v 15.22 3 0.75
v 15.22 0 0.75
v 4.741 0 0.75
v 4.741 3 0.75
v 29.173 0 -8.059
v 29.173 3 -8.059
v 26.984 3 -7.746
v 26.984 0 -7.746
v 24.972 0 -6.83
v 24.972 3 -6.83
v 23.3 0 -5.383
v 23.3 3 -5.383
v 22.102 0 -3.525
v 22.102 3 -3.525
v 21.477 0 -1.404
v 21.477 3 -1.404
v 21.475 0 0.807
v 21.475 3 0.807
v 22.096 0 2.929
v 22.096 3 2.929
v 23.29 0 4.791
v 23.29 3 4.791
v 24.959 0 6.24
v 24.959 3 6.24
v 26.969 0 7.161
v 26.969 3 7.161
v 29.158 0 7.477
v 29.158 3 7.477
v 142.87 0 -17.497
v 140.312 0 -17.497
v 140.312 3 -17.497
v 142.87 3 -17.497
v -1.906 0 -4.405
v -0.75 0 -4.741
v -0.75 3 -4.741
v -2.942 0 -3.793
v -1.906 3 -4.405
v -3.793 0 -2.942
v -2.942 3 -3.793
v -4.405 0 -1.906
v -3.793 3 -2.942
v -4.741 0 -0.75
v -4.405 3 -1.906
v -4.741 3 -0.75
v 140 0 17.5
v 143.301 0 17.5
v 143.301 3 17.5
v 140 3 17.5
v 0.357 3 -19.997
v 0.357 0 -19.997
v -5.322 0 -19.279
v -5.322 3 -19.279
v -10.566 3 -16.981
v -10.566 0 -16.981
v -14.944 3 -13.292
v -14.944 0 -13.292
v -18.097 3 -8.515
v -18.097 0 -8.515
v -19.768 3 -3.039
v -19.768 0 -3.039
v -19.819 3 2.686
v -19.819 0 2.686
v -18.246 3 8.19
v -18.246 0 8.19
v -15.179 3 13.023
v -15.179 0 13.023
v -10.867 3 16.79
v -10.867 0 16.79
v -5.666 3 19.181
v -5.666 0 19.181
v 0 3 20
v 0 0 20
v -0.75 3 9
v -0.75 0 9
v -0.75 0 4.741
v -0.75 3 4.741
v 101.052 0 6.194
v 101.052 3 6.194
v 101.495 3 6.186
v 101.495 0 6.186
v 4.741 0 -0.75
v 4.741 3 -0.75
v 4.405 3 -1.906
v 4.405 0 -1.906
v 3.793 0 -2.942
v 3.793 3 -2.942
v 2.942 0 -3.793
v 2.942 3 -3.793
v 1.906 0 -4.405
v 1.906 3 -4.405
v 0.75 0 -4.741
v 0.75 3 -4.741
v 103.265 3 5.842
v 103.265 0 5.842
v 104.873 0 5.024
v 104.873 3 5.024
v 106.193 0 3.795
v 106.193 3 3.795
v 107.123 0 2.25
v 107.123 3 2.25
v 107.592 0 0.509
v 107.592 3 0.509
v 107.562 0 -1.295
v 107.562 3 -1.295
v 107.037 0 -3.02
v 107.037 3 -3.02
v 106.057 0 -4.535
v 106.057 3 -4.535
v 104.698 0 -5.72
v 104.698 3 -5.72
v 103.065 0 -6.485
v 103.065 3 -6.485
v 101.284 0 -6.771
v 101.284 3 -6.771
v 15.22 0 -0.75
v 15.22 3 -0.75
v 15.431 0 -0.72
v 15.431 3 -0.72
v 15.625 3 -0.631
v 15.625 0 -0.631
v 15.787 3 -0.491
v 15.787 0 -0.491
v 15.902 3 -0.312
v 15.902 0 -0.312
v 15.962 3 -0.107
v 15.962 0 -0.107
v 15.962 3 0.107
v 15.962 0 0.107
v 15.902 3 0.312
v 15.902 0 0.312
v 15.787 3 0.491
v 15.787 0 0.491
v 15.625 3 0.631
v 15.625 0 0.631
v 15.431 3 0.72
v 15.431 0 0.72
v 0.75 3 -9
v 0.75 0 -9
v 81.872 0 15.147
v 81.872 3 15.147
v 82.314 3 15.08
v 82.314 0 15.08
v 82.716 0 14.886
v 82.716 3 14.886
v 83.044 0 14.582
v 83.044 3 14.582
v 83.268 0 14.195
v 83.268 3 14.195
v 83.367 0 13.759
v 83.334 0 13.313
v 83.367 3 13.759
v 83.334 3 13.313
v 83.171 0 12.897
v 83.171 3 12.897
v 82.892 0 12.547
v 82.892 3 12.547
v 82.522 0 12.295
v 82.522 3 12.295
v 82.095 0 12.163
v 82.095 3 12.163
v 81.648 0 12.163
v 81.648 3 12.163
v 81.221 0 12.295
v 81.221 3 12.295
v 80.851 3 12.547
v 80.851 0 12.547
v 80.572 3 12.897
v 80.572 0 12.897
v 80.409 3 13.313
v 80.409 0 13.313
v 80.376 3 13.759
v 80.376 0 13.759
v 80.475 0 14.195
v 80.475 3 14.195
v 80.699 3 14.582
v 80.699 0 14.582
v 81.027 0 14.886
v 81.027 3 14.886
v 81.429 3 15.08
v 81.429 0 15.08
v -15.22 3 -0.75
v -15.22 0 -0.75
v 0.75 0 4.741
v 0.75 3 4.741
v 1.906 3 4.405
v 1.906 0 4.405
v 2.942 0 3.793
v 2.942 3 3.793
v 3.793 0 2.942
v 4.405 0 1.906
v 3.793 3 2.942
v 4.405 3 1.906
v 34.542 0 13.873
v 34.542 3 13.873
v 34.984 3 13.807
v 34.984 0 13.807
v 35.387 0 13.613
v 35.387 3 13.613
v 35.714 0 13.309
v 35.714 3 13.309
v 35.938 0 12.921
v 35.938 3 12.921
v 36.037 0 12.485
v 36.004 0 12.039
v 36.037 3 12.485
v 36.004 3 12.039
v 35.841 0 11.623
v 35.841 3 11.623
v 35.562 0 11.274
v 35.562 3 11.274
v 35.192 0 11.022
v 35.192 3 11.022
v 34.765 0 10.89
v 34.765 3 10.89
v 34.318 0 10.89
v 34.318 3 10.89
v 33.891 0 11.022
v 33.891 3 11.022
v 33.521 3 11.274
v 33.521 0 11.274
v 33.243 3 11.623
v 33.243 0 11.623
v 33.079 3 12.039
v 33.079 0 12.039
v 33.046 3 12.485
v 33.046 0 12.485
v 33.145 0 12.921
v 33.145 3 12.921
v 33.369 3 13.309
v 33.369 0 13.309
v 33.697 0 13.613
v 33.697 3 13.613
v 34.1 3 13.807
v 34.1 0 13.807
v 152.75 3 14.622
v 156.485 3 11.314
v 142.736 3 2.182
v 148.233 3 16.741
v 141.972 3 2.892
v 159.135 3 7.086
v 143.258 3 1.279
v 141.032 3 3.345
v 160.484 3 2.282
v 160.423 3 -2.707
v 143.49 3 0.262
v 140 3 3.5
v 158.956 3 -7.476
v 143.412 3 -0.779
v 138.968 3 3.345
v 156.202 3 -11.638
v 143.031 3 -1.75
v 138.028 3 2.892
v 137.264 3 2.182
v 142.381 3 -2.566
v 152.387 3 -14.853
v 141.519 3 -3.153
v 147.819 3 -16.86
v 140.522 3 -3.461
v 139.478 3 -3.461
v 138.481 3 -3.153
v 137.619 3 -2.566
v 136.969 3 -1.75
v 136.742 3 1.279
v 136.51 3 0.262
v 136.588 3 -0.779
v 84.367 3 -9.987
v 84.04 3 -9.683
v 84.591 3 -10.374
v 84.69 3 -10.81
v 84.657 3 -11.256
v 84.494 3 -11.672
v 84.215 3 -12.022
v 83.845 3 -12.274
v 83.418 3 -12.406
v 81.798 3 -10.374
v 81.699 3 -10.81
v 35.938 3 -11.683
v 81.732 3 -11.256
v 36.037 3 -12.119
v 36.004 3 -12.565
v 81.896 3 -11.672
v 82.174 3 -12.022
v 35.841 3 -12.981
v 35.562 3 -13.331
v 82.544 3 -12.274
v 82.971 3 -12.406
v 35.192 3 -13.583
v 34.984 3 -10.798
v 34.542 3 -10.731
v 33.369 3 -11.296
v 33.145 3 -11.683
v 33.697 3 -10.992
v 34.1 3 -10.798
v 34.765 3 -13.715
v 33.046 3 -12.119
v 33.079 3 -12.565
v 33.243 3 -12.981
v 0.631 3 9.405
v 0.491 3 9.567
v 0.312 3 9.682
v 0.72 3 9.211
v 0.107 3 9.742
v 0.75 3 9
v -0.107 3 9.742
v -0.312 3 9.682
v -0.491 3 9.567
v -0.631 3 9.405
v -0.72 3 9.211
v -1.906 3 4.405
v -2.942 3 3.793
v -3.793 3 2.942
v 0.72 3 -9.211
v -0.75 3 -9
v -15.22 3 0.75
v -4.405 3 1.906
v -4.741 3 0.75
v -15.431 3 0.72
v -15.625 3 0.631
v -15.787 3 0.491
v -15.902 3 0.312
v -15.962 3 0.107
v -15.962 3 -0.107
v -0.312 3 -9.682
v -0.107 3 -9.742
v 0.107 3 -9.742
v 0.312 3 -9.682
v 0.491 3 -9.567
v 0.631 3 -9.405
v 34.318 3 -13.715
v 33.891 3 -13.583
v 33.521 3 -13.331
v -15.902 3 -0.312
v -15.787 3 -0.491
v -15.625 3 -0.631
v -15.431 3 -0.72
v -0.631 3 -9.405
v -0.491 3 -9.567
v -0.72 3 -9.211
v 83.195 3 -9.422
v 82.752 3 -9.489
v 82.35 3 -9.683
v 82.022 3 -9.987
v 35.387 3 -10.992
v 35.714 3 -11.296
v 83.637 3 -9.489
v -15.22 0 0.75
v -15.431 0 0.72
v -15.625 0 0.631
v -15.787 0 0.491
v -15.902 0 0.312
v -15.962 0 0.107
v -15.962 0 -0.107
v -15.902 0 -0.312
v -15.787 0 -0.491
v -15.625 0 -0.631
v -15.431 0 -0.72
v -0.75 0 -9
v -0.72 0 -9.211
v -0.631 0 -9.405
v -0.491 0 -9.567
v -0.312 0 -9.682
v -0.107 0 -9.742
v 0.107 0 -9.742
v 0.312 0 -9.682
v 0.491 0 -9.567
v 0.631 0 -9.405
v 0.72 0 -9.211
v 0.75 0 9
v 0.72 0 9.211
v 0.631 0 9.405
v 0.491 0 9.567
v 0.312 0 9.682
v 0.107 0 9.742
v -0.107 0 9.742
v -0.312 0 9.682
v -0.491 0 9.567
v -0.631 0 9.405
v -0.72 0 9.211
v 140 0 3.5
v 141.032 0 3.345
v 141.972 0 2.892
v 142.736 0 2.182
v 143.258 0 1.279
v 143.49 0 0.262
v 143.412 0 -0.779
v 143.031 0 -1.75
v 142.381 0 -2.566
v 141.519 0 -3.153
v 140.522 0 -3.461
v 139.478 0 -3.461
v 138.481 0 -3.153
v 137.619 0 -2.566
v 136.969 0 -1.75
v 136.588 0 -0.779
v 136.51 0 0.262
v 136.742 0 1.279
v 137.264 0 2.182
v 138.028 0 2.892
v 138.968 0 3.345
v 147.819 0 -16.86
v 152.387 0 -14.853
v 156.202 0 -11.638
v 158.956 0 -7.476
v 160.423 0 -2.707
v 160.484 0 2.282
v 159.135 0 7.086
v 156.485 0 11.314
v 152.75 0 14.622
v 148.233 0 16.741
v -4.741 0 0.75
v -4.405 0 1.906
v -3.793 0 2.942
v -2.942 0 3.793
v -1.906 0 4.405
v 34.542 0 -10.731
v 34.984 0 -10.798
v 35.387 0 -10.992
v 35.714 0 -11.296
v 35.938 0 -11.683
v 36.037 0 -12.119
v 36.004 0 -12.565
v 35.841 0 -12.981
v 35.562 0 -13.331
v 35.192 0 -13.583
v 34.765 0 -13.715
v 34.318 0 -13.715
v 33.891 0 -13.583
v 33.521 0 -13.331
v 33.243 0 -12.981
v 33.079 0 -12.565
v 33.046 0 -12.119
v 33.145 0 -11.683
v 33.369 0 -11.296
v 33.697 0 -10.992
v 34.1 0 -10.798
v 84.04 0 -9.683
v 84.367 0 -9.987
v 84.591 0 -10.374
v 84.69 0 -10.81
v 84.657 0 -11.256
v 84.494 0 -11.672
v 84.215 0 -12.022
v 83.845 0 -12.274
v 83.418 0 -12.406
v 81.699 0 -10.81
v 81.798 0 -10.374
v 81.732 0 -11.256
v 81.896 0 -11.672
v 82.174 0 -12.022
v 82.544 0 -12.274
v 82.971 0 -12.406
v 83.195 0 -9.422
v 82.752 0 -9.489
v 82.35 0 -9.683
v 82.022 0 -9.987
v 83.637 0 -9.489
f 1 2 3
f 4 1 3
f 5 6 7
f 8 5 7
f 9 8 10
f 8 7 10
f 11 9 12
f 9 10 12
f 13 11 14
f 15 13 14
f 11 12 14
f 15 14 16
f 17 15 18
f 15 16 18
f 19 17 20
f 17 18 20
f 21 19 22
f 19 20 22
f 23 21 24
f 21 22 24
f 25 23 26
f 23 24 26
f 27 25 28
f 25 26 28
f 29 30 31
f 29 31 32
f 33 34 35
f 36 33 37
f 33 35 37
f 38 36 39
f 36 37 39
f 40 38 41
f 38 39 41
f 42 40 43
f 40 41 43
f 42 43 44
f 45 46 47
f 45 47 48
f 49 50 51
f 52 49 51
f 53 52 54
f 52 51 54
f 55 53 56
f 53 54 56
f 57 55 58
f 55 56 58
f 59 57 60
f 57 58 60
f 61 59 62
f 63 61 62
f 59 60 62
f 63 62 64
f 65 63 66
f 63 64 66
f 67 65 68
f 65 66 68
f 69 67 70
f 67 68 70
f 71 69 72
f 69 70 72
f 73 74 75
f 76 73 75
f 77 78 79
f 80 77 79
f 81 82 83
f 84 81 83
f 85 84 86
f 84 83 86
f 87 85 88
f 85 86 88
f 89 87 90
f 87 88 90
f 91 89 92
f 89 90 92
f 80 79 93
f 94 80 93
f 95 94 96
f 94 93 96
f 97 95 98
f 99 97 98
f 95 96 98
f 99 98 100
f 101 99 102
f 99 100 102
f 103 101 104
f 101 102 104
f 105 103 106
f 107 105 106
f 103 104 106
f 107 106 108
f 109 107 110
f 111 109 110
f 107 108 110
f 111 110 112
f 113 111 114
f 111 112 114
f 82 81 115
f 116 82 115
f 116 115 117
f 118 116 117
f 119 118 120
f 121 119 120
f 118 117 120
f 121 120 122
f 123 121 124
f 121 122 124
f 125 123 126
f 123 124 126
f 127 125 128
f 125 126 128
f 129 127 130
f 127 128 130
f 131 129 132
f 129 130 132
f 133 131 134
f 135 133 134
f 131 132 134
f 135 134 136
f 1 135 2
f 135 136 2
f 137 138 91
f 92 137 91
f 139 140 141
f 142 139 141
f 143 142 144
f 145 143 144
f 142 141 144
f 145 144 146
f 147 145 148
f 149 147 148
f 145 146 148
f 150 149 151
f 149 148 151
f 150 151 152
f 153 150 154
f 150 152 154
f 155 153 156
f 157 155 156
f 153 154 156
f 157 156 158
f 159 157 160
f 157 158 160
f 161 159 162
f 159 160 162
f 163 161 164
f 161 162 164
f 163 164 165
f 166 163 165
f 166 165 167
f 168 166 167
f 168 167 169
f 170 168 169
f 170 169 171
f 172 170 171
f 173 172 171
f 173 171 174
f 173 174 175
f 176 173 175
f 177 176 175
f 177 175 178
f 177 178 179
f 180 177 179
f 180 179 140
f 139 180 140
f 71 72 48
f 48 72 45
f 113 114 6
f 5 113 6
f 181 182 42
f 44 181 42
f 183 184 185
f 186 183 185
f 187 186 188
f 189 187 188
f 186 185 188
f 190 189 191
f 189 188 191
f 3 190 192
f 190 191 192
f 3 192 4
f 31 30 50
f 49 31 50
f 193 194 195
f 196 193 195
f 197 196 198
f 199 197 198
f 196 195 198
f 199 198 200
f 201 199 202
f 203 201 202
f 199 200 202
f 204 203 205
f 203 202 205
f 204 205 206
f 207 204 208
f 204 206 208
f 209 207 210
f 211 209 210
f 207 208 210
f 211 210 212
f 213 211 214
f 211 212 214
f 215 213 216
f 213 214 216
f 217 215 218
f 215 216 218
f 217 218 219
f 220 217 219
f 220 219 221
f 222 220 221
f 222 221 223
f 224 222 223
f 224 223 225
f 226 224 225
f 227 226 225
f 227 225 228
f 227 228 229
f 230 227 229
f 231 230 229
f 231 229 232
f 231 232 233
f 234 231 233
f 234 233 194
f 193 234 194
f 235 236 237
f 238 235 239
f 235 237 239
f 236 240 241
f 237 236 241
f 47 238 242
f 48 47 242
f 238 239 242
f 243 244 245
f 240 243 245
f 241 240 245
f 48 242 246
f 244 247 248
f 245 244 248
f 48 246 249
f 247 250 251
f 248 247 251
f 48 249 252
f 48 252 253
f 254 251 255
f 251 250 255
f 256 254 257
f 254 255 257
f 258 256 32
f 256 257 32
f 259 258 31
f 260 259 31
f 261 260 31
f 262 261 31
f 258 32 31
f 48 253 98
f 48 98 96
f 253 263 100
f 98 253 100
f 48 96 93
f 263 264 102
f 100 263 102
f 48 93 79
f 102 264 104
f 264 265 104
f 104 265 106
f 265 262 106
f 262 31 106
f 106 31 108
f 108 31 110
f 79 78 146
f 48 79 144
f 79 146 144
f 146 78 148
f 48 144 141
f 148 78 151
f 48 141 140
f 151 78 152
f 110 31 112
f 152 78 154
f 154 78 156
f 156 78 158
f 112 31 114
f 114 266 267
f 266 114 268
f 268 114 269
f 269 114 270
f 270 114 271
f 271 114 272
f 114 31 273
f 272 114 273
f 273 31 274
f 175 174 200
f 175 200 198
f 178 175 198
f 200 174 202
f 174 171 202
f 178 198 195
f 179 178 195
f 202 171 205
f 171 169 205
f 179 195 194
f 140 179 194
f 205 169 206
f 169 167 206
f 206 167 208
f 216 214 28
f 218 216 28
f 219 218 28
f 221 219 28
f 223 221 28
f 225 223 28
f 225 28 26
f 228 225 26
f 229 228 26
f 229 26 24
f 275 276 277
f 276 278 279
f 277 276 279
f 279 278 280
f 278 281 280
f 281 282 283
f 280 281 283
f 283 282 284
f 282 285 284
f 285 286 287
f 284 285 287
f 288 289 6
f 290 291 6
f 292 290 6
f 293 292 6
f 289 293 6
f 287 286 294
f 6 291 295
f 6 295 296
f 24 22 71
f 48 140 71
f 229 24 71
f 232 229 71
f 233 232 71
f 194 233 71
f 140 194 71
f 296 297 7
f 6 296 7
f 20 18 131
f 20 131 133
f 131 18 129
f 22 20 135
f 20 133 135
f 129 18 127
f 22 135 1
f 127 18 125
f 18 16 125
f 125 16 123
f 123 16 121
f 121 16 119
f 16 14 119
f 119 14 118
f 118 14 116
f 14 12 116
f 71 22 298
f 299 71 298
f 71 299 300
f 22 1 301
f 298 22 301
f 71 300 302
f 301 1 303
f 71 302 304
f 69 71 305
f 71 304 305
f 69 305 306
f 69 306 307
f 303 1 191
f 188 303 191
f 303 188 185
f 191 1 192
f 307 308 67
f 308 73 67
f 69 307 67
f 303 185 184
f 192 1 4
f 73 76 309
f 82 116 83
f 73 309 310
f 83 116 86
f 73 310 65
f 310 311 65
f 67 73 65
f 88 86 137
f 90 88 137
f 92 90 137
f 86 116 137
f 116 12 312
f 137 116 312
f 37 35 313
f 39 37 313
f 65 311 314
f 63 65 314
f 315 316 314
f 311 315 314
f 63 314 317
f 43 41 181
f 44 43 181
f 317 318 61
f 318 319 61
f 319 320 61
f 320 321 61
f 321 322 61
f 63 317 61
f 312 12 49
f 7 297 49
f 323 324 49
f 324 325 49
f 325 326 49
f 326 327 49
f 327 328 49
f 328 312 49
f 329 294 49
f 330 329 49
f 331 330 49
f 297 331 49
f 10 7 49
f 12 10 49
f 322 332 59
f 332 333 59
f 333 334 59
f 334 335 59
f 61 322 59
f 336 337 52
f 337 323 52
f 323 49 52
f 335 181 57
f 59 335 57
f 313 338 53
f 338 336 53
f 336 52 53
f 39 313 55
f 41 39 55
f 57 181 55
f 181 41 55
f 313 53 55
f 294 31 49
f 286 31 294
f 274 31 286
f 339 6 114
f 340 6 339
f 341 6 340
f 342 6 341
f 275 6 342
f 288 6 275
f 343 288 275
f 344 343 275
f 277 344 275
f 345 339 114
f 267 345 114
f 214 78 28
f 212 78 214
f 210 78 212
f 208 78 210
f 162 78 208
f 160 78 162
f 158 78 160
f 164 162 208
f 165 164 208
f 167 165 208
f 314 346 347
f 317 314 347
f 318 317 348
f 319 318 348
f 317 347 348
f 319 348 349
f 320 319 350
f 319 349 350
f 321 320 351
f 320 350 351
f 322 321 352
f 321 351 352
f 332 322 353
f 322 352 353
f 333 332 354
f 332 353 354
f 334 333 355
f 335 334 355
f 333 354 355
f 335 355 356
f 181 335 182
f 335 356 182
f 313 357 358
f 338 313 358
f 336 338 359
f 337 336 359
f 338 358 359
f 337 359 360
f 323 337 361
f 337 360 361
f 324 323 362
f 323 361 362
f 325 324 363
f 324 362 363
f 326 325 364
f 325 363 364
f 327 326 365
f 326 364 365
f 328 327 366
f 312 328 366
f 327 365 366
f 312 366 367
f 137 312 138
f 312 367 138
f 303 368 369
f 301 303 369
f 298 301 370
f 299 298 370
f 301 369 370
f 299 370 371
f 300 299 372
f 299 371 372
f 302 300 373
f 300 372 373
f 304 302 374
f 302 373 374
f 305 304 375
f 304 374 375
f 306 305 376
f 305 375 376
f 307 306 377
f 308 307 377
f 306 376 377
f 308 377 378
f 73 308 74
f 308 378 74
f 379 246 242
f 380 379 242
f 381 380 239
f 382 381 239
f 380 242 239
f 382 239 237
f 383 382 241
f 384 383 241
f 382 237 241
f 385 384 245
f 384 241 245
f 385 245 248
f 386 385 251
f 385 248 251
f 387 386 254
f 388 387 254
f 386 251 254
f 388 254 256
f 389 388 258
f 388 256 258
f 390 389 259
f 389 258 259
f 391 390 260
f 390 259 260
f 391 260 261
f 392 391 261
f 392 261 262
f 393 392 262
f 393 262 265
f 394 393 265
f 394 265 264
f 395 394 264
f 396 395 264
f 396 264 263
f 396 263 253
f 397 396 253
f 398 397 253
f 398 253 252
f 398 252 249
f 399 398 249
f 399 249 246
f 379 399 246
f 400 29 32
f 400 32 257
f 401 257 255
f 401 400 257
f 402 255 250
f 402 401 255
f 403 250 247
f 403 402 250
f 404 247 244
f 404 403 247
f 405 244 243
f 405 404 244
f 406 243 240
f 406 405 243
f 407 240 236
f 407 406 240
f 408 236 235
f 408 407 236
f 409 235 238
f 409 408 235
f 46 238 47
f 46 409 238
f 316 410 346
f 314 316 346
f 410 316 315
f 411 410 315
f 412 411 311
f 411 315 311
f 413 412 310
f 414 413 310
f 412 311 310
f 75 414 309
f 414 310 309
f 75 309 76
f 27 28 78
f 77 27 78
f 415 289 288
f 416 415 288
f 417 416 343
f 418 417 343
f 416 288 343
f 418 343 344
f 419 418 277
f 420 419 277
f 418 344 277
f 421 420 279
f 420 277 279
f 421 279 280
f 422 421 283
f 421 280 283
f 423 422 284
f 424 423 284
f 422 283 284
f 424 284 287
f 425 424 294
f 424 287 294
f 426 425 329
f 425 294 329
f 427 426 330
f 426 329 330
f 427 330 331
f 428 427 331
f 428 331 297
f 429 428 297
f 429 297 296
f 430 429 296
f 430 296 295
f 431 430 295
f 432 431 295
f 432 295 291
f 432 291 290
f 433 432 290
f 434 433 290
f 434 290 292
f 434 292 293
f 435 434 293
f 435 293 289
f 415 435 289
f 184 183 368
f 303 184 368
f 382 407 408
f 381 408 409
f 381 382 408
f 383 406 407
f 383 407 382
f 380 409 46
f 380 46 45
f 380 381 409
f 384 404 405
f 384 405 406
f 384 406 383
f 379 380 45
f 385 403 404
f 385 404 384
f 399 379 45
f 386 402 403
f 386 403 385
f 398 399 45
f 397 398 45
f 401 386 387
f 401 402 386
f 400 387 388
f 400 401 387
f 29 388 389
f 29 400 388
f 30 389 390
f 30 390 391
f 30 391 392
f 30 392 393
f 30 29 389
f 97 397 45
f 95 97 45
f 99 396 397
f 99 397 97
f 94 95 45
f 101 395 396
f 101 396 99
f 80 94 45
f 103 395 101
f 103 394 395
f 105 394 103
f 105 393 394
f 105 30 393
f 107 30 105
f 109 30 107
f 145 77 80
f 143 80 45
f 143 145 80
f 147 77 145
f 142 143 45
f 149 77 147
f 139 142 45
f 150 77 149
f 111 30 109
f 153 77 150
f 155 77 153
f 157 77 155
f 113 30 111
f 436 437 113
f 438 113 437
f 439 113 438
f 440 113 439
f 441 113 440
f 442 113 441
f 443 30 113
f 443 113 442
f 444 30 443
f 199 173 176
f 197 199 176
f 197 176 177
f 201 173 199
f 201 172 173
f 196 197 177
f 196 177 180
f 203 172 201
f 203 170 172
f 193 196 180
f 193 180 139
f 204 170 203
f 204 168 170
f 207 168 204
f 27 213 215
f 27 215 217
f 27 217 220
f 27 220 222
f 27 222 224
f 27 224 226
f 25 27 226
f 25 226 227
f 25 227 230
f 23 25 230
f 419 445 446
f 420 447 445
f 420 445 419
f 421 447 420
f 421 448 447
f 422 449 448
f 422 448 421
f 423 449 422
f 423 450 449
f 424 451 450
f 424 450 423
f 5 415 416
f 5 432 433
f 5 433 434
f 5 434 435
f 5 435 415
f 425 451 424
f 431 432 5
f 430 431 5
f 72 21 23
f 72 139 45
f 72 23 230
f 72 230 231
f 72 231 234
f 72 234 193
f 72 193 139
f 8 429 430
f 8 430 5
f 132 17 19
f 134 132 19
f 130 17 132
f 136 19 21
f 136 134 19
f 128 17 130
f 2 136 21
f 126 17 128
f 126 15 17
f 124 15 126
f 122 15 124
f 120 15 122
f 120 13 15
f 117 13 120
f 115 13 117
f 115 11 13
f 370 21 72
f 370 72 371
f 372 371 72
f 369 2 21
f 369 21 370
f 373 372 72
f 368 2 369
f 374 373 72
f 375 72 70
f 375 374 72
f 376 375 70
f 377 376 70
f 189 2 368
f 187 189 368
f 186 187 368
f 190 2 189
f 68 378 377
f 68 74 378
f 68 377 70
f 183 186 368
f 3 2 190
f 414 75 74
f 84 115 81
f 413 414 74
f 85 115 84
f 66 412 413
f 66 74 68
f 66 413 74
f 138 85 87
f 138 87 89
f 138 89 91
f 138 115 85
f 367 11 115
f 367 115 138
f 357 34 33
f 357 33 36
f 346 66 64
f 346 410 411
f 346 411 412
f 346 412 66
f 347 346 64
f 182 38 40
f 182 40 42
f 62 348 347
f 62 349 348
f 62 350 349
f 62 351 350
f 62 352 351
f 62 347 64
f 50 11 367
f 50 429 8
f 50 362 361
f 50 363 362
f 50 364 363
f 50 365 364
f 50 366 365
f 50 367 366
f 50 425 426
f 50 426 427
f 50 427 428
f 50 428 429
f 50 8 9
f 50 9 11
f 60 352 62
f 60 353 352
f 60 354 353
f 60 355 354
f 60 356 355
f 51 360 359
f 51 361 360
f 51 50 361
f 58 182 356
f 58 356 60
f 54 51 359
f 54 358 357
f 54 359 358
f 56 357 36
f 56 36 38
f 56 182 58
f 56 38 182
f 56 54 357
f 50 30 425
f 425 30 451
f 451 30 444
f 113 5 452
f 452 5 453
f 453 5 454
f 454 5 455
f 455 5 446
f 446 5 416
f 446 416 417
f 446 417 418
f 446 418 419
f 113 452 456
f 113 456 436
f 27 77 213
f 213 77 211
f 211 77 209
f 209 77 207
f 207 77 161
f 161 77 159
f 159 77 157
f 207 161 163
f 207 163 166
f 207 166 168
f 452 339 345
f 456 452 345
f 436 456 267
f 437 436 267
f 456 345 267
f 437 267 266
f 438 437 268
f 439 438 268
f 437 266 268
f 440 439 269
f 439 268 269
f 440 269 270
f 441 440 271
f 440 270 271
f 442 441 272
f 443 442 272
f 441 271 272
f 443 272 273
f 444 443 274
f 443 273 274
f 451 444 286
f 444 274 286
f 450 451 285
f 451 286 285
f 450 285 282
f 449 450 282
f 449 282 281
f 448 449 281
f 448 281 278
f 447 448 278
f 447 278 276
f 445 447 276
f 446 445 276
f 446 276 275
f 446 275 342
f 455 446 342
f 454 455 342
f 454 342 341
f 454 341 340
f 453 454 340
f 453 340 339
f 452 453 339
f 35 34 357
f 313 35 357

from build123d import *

# Parameters (mm, degrees)
BOSS_EXTRUDE1_DEPTH = 3
SKETCH2_R           = 4.8
SKETCH2_R_2         = 3.375
CUT_EXTRUDE1_DEPTH  = 159.793104384
CUT_EXTRUDE3_DEPTH  = 159.793104384
CUT_EXTRUDE4_DEPTH  = 159.793104384
SKETCH8_R           = 3.5
CUT_EXTRUDE6_DEPTH  = 159.793104384
SKETCH12_R          = 1.5
CUT_EXTRUDE8_DEPTH  = 10
BOSS_EXTRUDE2_START = -3
BOSS_EXTRUDE2_DEPTH = 3


with BuildPart() as part:
    # Sketch1 → Boss-Extrude1 (new body)
    with BuildSketch(Plane(origin=(0, 0, 0), x_dir=(1, 0, 0), z_dir=(0, 1, 0))):
        with BuildLine():
            Line((140.3125, 17.497209599), (0.357142857, 19.99681097))
            ThreePointArc((0.357142857, 19.99681097), (-19.999202727, 0.178578547), (0, -20))
            Line((0, -20), (140, -17.5))
            ThreePointArc((140, -17.5), (157.499302386, -0.156256229), (140.3125, 17.497209599))
        make_face()
    extrude(amount=BOSS_EXTRUDE1_DEPTH)

    # Sketch2 → Cut-Extrude1 (cut, through all)
    with BuildSketch(Plane(origin=(0, 3, 0), x_dir=(1, 0, 0), z_dir=(0, 1, 0))):
        with Locations(Location((0, 0, 0), (0, 0, 270))):
            Circle(SKETCH2_R)
        with Locations(Location((140, 0, 0), (0, 0, 270))):
            Circle(SKETCH2_R_2)
    extrude(amount=-CUT_EXTRUDE1_DEPTH, mode=Mode.SUBTRACT)

    # Sketch4 → Cut-Extrude3 (cut, through all)
    with BuildSketch(Plane(origin=(0, 3, 0), x_dir=(1, 0, 0), z_dir=(0, 1, 0))):
        with BuildLine():
            ThreePointArc((101.494647455, -6.185682468), (107.64017994, 0.394224207), (101.283865867, 6.770744637))
            Line((101.283865867, 6.770744637), (29.173044697, 8.058643229))
            ThreePointArc((29.173044697, 8.058643229), (21.397292905, 0.29833633), (29.157599804, -7.477415462))
            Line((29.157599804, -7.477415462), (101.052392136, -6.193579885))
            Line((101.052392136, -6.193579885), (101.494647455, -6.185682468))
        make_face()
    extrude(amount=-CUT_EXTRUDE3_DEPTH, mode=Mode.SUBTRACT)

    # Sketch6 → Cut-Extrude4 (cut, through all)
    with BuildSketch(Plane(origin=(0, 0, 0), x_dir=(1, 0, 0), z_dir=(0, 1, 0))):
        with BuildLine():
            Line((-15.22, 0.75), (15.22, 0.75))
            ThreePointArc((15.22, 0.75), (15.97, 0), (15.22, -0.75))
            Line((15.22, -0.75), (-15.22, -0.75))
            ThreePointArc((-15.22, -0.75), (-15.97, 0), (-15.22, 0.75))
        make_face()
        with BuildLine():
            Line((-0.75, -9), (-0.75, 9))
            ThreePointArc((-0.75, 9), (0, 9.75), (0.75, 9))
            Line((0.75, 9), (0.75, -9))
            ThreePointArc((0.75, -9), (0, -9.75), (-0.75, -9))
        make_face()
    extrude(amount=CUT_EXTRUDE4_DEPTH, mode=Mode.SUBTRACT)

    # Sketch8 → Cut-Extrude6 (cut, through all)
    with BuildSketch(Plane(origin=(0, 3, 0), x_dir=(1, 0, 0), z_dir=(0, 1, 0))):
        Circle(SKETCH8_R)
        with Locations(Location((140, 0, 0), (0, 0, 270))):
            Circle(SKETCH8_R)
    extrude(amount=-CUT_EXTRUDE6_DEPTH, mode=Mode.SUBTRACT)

    # Sketch12 → Cut-Extrude8 (cut)
    with BuildSketch(Plane(origin=(0, 3, 0), x_dir=(1, 0, 0), z_dir=(0, 1, 0))):
        with Locations(Location((83.194560065, 10.922443863, 0), (0, 0, 270))):
            Circle(SKETCH12_R)
        with Locations(Location((34.541656008, 12.231474735, 0), (0, 0, 270))):
            Circle(SKETCH12_R)
        with Locations(Location((34.541656008, -12.373276524, 0), (0, 0, 270))):
            Circle(SKETCH12_R)
        with Locations(Location((81.871511394, -13.646710106, 0), (0, 0, 270))):
            Circle(SKETCH12_R)
    extrude(amount=-CUT_EXTRUDE8_DEPTH, mode=Mode.SUBTRACT)

    # Sketch14 → Boss-Extrude2 (add)
    with BuildSketch(Plane(origin=(0, 3, 0), x_dir=(1, 0, 0), z_dir=(0, 1, 0)).offset(BOSS_EXTRUDE2_START)):
        with BuildLine():
            Line((140.3125, 17.497209599), (142.86969749, 17.497209599))
            ThreePointArc((142.86969749, 17.497209599), (160.632042581, 0.214901924), (143.301107477, -17.5))
            Line((143.301107477, -17.5), (140, -17.5))
            ThreePointArc((140, -17.5), (157.499302386, -0.156256229), (140.3125, 17.497209599))
        make_face()
    extrude(amount=BOSS_EXTRUDE2_DEPTH)


solid = part.part
